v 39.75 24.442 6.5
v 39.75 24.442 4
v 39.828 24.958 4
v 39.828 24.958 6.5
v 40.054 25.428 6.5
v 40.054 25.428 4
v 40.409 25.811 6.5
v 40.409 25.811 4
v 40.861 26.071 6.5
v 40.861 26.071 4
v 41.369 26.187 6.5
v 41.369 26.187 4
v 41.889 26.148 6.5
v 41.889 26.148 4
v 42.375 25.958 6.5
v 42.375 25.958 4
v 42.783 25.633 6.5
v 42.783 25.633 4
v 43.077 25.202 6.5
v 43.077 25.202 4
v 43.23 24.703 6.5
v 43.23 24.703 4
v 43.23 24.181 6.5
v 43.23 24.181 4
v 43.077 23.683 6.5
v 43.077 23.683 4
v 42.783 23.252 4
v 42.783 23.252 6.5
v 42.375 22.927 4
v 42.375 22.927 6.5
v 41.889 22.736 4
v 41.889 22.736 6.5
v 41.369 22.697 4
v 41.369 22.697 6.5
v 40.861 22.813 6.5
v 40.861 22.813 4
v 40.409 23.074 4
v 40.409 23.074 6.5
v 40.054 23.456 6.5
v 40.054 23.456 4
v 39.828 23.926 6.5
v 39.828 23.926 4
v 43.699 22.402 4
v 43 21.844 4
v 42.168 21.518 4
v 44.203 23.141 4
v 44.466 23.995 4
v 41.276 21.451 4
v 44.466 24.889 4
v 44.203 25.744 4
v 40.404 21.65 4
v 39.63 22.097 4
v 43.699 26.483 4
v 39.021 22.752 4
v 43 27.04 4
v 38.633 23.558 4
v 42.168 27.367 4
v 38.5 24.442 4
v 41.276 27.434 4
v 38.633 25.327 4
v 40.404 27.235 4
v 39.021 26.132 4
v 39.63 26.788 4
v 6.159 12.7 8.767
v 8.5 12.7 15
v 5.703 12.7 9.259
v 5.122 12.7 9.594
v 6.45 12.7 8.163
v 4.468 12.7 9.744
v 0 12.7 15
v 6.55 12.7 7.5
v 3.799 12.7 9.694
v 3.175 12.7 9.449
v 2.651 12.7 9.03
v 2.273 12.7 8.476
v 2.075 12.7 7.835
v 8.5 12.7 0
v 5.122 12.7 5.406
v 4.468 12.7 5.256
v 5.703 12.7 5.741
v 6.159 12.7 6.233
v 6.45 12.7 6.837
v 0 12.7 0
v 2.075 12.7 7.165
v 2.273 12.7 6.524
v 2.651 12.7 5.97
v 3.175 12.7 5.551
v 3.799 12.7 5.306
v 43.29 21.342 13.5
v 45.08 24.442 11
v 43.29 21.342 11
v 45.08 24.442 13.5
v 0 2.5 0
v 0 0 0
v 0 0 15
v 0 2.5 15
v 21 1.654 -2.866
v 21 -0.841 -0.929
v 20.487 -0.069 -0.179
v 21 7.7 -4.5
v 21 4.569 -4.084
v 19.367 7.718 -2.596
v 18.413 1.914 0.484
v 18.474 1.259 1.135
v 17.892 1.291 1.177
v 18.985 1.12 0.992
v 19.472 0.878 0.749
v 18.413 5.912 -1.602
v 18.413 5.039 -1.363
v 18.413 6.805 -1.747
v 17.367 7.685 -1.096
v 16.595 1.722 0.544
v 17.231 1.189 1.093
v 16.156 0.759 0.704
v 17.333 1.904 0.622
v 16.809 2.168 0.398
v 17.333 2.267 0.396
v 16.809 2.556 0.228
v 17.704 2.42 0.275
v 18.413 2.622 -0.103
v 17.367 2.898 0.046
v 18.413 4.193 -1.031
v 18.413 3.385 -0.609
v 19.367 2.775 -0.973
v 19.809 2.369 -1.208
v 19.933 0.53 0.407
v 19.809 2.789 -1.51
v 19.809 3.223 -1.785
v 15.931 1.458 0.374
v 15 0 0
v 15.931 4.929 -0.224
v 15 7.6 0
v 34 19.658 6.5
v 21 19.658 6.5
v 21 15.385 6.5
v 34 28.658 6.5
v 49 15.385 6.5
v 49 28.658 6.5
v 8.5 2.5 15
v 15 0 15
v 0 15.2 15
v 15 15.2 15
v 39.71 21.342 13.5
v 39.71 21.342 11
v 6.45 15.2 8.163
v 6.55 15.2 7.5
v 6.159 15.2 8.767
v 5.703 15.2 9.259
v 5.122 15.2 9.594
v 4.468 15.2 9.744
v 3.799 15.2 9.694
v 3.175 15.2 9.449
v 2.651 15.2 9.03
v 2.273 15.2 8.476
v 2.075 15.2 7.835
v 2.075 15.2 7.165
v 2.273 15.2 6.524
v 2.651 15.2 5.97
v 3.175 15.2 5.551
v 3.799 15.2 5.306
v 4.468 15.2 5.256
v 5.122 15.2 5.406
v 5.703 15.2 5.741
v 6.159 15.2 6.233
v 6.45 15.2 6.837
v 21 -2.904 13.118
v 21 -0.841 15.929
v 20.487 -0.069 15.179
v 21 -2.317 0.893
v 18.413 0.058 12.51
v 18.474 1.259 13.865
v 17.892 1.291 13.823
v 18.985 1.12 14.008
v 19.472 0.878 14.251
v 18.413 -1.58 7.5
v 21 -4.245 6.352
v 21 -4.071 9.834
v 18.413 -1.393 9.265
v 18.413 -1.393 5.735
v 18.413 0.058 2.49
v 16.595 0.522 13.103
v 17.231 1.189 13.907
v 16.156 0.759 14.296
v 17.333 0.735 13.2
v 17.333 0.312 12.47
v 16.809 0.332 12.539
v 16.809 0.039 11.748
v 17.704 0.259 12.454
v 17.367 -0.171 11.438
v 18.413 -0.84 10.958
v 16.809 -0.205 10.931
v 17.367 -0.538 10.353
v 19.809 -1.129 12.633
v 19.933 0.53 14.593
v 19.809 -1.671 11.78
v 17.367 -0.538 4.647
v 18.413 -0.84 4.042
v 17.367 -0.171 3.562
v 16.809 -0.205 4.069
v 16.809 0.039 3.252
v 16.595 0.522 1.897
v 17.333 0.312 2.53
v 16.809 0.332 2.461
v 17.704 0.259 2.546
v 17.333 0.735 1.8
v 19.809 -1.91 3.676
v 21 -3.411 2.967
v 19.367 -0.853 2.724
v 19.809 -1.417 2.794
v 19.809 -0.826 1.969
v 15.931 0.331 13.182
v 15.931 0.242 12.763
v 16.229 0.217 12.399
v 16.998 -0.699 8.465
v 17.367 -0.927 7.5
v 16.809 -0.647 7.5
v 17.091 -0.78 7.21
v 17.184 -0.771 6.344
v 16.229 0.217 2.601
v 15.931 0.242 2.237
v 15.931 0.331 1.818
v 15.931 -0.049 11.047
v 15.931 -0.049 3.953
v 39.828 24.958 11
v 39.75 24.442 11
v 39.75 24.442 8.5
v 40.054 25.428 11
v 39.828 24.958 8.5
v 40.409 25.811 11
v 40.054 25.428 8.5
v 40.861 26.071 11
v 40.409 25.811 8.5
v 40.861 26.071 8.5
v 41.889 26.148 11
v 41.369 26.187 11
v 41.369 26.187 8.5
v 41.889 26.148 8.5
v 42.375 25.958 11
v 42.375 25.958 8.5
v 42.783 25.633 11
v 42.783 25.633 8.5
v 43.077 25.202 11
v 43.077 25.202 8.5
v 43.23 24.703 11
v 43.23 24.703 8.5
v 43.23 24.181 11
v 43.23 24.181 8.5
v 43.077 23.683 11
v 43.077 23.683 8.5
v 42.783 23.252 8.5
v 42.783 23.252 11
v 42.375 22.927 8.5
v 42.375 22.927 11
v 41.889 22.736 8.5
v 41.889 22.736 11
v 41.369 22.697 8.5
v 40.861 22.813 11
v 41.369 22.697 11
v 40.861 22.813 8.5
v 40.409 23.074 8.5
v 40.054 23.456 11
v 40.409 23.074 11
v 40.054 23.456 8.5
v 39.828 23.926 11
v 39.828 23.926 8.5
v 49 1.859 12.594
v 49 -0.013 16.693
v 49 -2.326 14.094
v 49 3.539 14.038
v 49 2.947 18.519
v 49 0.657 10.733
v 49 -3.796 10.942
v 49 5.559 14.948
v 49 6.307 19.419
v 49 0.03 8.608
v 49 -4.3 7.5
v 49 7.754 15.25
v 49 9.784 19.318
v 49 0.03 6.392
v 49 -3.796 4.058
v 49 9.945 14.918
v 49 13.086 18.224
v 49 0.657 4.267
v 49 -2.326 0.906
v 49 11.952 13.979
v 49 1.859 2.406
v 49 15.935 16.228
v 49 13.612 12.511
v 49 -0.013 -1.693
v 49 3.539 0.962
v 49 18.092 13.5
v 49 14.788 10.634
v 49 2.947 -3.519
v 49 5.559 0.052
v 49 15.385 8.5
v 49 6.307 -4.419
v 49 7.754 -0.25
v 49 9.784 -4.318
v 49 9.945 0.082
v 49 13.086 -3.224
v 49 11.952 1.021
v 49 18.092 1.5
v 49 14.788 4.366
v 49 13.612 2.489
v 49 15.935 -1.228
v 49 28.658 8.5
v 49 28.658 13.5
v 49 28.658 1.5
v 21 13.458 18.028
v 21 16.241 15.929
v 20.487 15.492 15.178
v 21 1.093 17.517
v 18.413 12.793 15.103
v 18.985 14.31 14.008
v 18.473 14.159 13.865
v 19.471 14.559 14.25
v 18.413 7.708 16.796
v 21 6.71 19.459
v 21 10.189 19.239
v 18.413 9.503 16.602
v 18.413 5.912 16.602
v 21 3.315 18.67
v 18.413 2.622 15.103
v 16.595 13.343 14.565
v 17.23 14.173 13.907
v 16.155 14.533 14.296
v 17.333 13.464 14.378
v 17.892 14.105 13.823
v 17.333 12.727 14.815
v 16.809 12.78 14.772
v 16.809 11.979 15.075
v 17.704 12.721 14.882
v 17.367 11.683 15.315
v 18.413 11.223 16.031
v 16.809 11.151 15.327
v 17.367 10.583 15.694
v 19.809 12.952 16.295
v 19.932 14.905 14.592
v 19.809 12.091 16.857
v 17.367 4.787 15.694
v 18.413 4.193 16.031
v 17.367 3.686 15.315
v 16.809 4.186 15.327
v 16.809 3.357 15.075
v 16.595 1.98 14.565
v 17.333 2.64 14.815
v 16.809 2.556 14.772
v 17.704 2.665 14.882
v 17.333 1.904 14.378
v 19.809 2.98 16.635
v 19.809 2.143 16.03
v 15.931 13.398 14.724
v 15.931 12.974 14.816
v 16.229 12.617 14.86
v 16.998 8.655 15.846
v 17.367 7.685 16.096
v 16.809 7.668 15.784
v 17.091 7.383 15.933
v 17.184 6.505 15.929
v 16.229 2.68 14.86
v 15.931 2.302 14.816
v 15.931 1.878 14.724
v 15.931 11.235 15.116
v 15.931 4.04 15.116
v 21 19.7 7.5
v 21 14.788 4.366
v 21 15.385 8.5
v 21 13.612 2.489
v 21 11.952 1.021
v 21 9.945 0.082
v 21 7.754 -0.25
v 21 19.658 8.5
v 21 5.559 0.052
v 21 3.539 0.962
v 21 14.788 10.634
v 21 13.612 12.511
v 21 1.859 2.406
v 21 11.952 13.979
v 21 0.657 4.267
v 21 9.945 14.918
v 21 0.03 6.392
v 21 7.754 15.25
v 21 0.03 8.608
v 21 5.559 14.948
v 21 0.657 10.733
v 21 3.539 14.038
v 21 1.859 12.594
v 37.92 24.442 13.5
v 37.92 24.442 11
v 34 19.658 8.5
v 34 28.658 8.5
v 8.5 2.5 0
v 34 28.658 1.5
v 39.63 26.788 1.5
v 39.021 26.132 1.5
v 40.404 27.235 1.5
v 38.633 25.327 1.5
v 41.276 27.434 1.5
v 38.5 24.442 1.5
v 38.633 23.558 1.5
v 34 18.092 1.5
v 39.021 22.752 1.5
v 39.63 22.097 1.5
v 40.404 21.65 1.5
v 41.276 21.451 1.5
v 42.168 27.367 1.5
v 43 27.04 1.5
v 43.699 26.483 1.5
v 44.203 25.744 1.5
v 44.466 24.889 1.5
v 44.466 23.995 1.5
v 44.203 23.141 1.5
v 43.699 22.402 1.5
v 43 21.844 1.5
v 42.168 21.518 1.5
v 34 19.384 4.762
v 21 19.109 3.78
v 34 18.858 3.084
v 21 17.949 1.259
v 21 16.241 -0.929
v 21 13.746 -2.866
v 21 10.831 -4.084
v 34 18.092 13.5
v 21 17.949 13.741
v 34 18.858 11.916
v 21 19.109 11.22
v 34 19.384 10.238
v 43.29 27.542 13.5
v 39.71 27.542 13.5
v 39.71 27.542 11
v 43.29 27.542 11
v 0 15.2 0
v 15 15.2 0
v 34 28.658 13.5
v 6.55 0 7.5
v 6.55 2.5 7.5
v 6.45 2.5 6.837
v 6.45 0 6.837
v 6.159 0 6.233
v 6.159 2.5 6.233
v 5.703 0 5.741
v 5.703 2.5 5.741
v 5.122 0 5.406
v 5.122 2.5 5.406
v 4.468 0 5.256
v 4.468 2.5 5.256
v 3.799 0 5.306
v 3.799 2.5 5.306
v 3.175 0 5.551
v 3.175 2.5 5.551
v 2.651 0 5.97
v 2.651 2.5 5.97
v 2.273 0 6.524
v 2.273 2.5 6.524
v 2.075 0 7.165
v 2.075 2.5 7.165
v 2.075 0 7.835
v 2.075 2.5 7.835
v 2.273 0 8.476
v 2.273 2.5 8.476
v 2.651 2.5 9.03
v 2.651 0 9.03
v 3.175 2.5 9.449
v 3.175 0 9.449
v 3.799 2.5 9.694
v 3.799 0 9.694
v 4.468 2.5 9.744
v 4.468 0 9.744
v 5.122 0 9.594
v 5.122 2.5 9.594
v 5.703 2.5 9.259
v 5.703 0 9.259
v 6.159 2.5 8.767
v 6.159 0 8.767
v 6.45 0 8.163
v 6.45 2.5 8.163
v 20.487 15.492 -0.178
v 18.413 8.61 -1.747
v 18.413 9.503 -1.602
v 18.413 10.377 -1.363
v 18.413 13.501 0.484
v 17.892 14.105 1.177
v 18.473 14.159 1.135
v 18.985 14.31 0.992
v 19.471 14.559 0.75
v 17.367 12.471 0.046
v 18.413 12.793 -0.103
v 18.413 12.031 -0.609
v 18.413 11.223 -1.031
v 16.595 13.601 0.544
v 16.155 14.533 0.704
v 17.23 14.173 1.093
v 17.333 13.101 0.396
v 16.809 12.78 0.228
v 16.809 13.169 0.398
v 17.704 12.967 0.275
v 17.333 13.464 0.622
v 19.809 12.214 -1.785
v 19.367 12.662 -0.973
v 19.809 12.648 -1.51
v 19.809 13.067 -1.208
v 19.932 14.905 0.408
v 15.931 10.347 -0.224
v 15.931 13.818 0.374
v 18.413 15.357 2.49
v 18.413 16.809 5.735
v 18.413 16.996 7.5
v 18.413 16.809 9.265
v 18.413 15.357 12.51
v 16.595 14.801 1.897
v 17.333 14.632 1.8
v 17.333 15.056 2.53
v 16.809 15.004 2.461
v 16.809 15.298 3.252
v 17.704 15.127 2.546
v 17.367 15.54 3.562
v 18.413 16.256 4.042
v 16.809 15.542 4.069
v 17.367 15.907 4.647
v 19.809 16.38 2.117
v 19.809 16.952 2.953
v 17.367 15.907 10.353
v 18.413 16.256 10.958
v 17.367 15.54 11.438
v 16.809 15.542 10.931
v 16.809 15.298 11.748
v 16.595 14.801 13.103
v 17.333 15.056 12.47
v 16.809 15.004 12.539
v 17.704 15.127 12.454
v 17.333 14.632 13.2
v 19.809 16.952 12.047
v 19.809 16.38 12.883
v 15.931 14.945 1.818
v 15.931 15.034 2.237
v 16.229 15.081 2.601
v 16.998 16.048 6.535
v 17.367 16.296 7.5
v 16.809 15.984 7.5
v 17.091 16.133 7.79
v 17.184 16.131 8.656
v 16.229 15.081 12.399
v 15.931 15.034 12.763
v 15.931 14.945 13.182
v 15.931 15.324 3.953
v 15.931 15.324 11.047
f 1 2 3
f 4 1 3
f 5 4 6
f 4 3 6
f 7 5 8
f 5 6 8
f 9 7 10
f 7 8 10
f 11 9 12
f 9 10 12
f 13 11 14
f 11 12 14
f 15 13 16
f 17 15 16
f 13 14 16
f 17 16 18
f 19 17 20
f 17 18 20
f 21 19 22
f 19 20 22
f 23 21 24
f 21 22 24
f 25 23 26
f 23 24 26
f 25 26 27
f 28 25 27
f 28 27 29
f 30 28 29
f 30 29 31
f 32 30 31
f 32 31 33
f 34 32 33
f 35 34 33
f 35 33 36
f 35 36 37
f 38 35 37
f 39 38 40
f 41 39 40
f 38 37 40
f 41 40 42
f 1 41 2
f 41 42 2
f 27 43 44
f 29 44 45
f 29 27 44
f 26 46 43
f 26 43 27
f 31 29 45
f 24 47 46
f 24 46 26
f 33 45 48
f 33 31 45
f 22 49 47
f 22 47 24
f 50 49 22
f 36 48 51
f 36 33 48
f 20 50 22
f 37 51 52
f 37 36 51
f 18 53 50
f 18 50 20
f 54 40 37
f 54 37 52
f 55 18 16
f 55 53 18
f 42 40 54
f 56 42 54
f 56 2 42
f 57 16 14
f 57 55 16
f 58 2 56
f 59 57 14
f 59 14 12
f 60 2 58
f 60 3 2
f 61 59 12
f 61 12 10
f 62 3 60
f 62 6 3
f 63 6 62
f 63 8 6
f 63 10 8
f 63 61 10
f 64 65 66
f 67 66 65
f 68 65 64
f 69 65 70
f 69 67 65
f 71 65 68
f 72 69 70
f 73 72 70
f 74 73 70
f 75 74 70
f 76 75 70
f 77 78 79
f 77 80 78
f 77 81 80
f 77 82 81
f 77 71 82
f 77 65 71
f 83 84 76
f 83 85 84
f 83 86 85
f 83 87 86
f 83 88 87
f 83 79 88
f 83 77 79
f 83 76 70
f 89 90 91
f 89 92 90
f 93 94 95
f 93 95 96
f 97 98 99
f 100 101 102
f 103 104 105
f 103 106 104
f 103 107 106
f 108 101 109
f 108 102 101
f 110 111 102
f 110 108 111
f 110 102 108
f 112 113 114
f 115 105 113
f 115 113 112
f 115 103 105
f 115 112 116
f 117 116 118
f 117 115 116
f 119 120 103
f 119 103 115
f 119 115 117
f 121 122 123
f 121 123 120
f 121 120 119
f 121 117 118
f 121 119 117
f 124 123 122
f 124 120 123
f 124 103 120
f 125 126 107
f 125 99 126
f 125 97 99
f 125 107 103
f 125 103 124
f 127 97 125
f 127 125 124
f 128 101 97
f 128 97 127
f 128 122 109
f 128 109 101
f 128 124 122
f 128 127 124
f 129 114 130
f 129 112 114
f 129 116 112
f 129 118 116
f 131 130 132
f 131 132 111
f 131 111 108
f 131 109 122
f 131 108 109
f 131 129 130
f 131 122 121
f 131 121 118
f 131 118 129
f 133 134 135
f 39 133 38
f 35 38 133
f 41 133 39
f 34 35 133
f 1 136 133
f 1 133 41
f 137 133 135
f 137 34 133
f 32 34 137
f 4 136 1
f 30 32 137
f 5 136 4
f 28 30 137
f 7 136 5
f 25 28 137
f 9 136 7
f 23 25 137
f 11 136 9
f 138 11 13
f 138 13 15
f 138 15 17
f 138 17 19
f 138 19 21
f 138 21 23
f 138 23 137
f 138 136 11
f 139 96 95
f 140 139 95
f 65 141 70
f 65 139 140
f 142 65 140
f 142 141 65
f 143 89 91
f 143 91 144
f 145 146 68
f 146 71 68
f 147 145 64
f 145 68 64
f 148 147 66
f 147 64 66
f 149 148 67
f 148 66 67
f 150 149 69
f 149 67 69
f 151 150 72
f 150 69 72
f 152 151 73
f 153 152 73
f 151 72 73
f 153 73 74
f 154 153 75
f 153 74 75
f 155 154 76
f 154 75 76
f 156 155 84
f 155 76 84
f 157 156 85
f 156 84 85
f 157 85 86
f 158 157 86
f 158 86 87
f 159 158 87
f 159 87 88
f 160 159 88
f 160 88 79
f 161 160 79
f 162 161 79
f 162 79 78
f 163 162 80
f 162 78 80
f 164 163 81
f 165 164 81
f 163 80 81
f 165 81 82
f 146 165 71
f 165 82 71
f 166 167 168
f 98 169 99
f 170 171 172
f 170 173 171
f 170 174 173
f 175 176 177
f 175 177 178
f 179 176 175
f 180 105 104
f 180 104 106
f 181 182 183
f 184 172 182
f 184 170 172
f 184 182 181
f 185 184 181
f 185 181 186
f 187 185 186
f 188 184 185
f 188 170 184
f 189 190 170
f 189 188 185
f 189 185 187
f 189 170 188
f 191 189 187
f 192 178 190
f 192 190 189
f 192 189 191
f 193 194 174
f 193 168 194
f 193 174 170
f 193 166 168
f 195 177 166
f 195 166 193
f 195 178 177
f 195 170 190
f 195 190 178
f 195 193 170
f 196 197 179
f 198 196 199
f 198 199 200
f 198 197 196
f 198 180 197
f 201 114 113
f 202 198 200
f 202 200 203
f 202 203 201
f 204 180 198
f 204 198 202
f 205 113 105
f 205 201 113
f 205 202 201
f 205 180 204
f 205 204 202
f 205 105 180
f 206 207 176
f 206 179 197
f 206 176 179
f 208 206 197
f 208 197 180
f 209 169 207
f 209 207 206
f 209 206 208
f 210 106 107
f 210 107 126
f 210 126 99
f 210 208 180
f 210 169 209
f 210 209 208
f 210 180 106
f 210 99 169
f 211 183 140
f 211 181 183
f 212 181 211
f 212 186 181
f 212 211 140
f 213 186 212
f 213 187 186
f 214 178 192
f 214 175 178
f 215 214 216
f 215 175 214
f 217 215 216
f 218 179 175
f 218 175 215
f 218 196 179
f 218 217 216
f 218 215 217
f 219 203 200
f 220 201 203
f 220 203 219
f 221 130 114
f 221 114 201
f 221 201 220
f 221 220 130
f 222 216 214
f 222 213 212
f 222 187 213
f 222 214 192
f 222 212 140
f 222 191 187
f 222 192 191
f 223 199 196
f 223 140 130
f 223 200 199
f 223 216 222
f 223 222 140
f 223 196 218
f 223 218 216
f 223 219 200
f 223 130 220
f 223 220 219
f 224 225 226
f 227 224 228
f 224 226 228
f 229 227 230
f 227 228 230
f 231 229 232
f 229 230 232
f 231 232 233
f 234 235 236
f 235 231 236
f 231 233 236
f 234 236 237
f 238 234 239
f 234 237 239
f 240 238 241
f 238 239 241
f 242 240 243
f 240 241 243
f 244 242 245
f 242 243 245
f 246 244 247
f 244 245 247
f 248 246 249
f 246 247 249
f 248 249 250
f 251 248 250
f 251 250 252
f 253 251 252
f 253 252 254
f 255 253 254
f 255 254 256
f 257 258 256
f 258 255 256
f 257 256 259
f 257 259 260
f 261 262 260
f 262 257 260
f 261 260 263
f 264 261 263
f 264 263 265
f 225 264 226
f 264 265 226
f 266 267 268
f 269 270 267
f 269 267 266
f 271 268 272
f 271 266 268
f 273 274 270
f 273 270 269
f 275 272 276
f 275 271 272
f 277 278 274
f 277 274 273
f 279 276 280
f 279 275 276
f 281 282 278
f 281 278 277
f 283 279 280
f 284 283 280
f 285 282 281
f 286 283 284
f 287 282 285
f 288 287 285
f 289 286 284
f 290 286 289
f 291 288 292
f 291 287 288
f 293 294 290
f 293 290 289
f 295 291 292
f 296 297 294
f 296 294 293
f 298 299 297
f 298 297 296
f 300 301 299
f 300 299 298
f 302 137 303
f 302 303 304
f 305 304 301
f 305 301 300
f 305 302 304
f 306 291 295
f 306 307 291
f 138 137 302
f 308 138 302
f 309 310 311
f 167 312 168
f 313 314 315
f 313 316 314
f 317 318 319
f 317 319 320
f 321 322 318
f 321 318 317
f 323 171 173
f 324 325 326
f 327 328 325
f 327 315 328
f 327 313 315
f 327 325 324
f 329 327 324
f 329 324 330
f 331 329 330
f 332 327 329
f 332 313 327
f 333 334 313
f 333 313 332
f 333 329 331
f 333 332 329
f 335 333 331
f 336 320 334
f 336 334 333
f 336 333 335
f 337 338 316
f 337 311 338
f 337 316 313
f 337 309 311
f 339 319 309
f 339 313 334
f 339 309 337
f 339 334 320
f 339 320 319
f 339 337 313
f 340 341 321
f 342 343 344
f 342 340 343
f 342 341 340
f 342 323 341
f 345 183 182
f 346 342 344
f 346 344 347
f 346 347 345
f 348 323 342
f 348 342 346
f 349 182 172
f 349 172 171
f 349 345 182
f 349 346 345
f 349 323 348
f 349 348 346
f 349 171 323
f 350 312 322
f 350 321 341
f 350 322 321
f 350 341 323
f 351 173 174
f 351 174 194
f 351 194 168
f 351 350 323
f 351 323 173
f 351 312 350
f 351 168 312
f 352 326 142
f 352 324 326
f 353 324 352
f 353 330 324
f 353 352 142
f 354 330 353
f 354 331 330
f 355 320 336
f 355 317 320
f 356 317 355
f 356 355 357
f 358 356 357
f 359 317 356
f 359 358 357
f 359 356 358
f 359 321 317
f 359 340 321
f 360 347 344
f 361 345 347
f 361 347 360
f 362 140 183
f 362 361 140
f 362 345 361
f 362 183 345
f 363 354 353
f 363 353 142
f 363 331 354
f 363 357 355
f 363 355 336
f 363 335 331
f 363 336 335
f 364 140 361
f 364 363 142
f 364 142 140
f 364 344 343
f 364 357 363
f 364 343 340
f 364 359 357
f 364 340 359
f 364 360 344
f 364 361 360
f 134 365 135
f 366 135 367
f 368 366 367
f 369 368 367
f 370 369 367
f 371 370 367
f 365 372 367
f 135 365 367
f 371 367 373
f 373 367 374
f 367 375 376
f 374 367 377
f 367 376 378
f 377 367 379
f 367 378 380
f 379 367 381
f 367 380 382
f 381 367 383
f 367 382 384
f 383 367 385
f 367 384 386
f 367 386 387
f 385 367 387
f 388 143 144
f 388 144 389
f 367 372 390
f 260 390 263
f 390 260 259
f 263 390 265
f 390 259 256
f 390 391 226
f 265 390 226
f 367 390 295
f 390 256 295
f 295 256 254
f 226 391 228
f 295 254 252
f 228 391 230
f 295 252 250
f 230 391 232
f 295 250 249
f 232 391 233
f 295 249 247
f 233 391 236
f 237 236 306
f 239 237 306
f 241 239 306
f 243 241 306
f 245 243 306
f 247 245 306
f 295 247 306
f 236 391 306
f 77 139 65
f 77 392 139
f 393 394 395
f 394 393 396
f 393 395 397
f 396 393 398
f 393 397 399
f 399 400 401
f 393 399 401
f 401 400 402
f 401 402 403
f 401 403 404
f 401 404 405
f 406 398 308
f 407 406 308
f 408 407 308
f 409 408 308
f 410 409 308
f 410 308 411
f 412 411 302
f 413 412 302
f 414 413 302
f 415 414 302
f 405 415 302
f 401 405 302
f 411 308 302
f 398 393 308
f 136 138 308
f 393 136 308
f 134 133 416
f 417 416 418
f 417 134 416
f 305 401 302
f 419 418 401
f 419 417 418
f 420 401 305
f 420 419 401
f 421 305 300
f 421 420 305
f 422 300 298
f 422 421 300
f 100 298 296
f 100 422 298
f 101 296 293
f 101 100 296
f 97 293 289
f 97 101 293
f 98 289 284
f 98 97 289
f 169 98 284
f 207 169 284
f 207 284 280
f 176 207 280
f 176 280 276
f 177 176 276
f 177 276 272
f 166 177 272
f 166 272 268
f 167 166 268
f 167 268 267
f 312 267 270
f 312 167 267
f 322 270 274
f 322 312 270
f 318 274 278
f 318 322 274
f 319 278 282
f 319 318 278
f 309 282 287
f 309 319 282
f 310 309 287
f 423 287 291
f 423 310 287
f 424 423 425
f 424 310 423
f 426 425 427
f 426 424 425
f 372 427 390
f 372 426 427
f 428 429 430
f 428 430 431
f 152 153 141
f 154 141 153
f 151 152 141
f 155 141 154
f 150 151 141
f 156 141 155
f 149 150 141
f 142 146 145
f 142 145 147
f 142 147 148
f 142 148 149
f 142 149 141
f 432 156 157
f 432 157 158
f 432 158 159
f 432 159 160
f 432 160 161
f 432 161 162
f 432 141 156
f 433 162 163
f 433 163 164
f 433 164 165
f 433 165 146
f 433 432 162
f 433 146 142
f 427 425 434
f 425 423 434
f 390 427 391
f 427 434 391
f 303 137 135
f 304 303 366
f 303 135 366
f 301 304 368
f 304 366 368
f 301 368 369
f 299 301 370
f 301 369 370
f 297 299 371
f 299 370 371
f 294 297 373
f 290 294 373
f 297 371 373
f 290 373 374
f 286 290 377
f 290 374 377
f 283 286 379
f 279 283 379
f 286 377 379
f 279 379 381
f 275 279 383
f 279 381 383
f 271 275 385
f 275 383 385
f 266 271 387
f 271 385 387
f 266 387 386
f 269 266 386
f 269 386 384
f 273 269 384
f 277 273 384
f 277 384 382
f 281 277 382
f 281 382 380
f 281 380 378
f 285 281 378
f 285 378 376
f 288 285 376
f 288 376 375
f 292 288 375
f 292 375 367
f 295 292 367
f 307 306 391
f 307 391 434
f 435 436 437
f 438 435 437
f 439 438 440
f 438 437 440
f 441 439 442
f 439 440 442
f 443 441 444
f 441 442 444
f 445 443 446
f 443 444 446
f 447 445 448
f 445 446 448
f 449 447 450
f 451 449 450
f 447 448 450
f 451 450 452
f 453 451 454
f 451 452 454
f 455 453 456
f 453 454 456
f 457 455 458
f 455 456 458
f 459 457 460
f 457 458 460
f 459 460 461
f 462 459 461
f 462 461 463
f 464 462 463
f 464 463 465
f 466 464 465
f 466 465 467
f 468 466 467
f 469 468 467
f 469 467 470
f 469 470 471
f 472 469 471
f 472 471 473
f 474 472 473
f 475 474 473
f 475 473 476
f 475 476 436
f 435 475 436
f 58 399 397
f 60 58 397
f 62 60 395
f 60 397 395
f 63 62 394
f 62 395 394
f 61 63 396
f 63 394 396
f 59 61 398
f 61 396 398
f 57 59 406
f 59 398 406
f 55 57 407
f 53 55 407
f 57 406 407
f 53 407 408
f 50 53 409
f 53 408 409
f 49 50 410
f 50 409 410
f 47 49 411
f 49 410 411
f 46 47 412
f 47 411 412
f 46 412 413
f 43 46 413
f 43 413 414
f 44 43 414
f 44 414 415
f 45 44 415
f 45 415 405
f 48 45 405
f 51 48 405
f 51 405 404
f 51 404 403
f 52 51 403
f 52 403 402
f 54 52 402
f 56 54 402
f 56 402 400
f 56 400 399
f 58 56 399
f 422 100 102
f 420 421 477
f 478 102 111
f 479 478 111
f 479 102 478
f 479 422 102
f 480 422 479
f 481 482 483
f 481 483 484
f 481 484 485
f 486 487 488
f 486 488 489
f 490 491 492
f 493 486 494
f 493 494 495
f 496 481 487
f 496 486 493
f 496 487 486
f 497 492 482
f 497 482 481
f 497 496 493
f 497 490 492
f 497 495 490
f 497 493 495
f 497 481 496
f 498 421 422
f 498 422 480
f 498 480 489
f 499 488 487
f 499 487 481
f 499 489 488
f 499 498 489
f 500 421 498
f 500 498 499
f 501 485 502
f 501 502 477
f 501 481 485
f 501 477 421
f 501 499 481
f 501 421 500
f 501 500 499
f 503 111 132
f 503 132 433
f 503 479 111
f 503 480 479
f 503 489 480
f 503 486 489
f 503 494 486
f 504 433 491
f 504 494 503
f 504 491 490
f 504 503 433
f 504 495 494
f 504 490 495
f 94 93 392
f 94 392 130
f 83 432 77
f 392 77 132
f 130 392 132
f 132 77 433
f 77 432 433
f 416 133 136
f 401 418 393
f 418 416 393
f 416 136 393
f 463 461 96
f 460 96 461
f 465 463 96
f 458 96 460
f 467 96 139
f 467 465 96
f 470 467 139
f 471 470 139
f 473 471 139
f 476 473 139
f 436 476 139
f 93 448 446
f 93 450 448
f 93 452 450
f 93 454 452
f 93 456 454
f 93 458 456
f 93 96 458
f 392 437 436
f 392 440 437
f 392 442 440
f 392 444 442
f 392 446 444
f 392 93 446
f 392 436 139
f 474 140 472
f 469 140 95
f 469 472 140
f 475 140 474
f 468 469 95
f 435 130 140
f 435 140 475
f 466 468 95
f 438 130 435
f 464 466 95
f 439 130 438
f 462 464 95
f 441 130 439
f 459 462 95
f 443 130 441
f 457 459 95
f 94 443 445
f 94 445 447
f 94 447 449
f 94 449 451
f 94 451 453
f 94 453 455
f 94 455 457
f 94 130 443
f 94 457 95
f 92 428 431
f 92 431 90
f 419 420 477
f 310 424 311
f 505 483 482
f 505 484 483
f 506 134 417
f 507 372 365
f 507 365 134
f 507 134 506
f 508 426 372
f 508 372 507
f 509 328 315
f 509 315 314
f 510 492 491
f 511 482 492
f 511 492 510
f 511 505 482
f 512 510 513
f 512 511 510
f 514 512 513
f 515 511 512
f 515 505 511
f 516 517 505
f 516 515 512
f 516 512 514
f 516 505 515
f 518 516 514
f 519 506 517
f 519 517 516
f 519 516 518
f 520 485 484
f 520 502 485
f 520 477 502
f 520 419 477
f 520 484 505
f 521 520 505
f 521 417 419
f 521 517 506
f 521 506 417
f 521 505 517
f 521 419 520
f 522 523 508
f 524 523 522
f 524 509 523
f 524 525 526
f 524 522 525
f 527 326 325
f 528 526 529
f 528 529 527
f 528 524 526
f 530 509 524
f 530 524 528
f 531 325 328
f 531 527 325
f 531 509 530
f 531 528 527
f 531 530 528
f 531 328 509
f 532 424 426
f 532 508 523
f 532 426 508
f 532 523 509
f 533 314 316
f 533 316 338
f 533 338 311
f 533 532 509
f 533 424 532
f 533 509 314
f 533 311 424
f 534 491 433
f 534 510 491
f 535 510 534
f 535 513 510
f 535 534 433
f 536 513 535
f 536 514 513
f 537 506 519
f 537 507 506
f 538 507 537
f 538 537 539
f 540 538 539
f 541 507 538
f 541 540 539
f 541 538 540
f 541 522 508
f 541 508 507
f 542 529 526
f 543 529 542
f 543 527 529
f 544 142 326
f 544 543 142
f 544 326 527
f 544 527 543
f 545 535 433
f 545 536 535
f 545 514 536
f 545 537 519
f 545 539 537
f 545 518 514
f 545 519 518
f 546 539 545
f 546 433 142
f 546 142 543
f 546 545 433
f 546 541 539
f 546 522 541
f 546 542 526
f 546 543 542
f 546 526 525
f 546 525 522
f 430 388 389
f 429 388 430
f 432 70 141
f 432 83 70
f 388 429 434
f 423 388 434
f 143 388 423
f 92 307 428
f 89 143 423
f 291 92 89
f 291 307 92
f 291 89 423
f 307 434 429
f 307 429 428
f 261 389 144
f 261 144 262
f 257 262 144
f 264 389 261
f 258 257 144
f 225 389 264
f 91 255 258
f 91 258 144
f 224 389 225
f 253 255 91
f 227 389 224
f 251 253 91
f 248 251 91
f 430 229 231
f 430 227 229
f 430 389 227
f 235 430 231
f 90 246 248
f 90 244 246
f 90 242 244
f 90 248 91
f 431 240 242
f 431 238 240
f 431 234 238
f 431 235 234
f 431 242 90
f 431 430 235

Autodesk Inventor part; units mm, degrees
ref_plane "YZ Plane" through (0, 0, 0) normal (1, 0, 0) x (0, 1, 0)
sketch "Sketch1" plane through (0, 0, 0) normal (0, 0, 1) x (1, 0, 0)
  line L0 (0, 0) -> (0, 2.5)
  line L1 (0, 2.5) -> (8.5, 2.5)
  line L2 (8.5, 2.5) -> (8.5, 12.7)
  line L3 (8.5, 12.7) -> (0, 12.7)
  line L4 (0, 12.7) -> (0, 15.2)
  line L5 (0, 15.2) -> (15, 15.2)
  line L6 (15, 15.2) -> (15, 0)
  line L7 (15, 0) -> (0, 0)
  dimension "d0" = 2.5
  dimension "d1" = 8.5
  dimension "d2" = 10.2
  dimension "d3" = 2.5
  dimension "d4" = 15
extrude "Extrusion1" add sketch "Sketch1" along normal blind 15
ref_plane "Work Plane1" through (18, 0, 0) normal (1, 0, 0) x (0, 0, -1)
sketch "Sketch3" plane through (15, 0, 0) normal (1, 0, 0) x (0, 0, -1)
  line L0 (0, 15.2) -> (-15, 15.2) projected
  line L1 (-15, 15.2) -> (0, 15.2)
  line L2 (0, 0) -> (-15, 0) projected
  line L3 (0, 15.2) -> (0, 0)
  line L4 (-15, 2.5) -> (-15, 0) projected
  line L5 (0, 0) -> (-15, 0)
  line L6 (-15, 15.2) -> (-15, 12.7) projected
  line L7 (-15, 0) -> (-15, 15.2)
sketch "Sketch4" plane through (18, 0, 0) normal (1, 0, 0) x (0, 0, -1)
  circle A0 centre (-7.5, 7.7) radius 9
  line L0 (0, 15.2) -> (-15, 15.2) projected
  line L1 (-15, 0) -> (-15, 15.2) projected
  point P0 (0, 0)
  dimension "d10" = 18
  dimension "d11" = 7.5
  dimension "d12" = 7.5
ref_plane "Work Plane2" through (21, 7.7, 7.5) normal (1, 0, 0) x (0, 0, -1)
sketch "Sketch5" plane through (21, 7.7, 7.5) normal (1, 0, 0) x (0, 0, -1)
  circle A0 centre (0, 0) radius 12
  point P0 (7.5, -7.7)
  dimension "d18" = 24
sketch "Sketch4 outline for Loft2" plane through (18, 0, 0) normal (1, 0, 0) x (0, 0, -1)
  circle A0 centre (-7.5, 7.7) radius 9
sketch "Sketch5 outline for Loft2" plane through (21, 7.7, 7.5) normal (1, 0, 0) x (0, 0, -1)
  circle A0 centre (0, 0) radius 12
loft "Loft2" add profiles "Sketch4 outline for Loft2", "Sketch5 outline for Loft2" section 1 edges at (15, 7.6, 0) (15, 15.2, 7.5) (15, 7.6, 15) (15, 0, 7.5)
sketch "Sketch6" plane through (21, 7.7, 7.5) normal (1, 0, 0) x (0, 0, -1)
  circle A0 centre (0, 0) radius 7.75
  circle A1 centre (0, 0) radius 12
  point P0 (7.5, -7.7)
  dimension "d25" = 15.5
extrude "Extrusion2" add sketch "Sketch6" along normal blind 28
ref_plane "Work Plane3" through (0, 0, 7.5) normal (0, 0, 1) x (1, 0, 0)
sketch "Sketch7" plane through (0, 0, 7.5) normal (0, 0, 1) x (1, 0, 0)
  line L0 (21, 19.7) -> (49, 19.7)
  line L1 (49, 19.7) -> (21, 19.7)
  line L2 (21, 16.241288) -> (21, -0.841288)
  line L3 (21, 15.217594) -> (49, 15.217594)
  line L4 (49, -4.3) -> (49, 19.7)
  line L5 (49, 15.217594) -> (49, 19.7)
  line L6 (21, 19.7) -> (21, 16.241288)
  line L7 (21, 19.7) -> (21, 15.217594)
  point P0 (0, 0)
extrude "Extrusion3" cut sketch "Sketch7" against normal mid plane 2
sketch "Sketch8" plane through (49, 7.7, 7.5) normal (1, 0, 0) x (0, 0, -1)
  point P0 (7.5, -7.7)
sketch "Sketch10" plane through (49, 7.7, 7.5) normal (1, 0, 0) x (0, 0, -1)
  arc A0 (-1, 11.958261) -> (-8.428903, 8.541288) centre (0, 0) ccw
  line L0 (-1, 11.958261) -> (-1, 20.958261)
  line L1 (-1, 20.958261) -> (-6, 20.958261)
  line L2 (-6, 20.958261) -> (-6, 10.392305)
  arc A1 (8.428903, 8.541288) -> (1, 11.958261) centre (0, 0) ccw
  line L3 (1, 11.958261) -> (1, 20.958261)
  line L4 (1, 20.958261) -> (6, 20.958261)
  line L5 (6, 20.958261) -> (6, 10.392305)
  arc A2 (-1, 11.958261) -> (-6, 10.392305) centre (0, 0) ccw
  line L6 (1, 7.685213) -> (1, 11.958261)
  arc A3 (6, 10.392305) -> (1, 11.958261) centre (0, 0) ccw
  point P0 (7.5, -7.7)
  dimension "d33" = 9
  dimension "d34" = 5
  dimension "d35" = 5
extrude "Extrusion4" add sketch "Sketch10" against normal blind 15
sketch "Sketch11" plane through (49, 18.092305, 1.5) normal (0, 0, -1) x (-1, 0, 0)
  circle A0 centre (7.5, 6.35) radius 1.75
  point P0 (49, -18.092305)
  dimension "d38" = 3.5
extrude "Extrusion5" cut sketch "Sketch11" against normal through all
sketch "Sketch12" plane through (49, 18.092305, 1.5) normal (0, 0, -1) x (-1, 0, 0)
  circle A0 centre (7.5, 6.35) radius 1.75 projected
  circle A1 centre (7.5, 6.35) radius 3
  point P0 (49, -18.092305)
  dimension "d41" = 6
extrude "Extrusion6" cut sketch "Sketch12" against normal blind 2.5 contours A0 | A1
sketch "Sketch13" plane through (0, 0, 8.5) normal (0, 0, -1) x (-1, 0, 0)
  point P0 (0, 0)
sketch "Sketch14" plane through (49, 18.092305, 13.5) normal (0, 0, 1) x (1, 0, 0)
  circle A0 centre (-7.5, 6.35) radius 1.75
  line L0 (-3.920428, 6.35) -> (-5.710214, 3.25)
  line L1 (-5.710214, 3.25) -> (-9.289786, 3.25)
  line L2 (-9.289786, 3.25) -> (-11.079572, 6.35)
  line L3 (-11.079572, 6.35) -> (-9.289786, 9.45)
  line L4 (-9.289786, 9.45) -> (-5.710214, 9.45)
  line L5 (-5.710214, 9.45) -> (-3.920428, 6.35)
  point P0 (-49, -18.092305)
  dimension "d44" = 6.2
extrude "Extrusion7" cut sketch "Sketch14" against normal blind 2.5
sketch "Sketch15" plane through (0, 2.5, 0) normal (0, 1, 0) x (1, 0, 0)
  circle A0 centre (4.3, -7.5) radius 2.25
  line L0 (8.5, 0) -> (8.5, -15) projected
  point P0 (0, 0)
  dimension "d47" = 4.5
  dimension "d48" = 4.2
extrude "Extrusion8" cut sketch "Sketch15" along normal through all both and the other way through all
properties part number "Arm connection"
